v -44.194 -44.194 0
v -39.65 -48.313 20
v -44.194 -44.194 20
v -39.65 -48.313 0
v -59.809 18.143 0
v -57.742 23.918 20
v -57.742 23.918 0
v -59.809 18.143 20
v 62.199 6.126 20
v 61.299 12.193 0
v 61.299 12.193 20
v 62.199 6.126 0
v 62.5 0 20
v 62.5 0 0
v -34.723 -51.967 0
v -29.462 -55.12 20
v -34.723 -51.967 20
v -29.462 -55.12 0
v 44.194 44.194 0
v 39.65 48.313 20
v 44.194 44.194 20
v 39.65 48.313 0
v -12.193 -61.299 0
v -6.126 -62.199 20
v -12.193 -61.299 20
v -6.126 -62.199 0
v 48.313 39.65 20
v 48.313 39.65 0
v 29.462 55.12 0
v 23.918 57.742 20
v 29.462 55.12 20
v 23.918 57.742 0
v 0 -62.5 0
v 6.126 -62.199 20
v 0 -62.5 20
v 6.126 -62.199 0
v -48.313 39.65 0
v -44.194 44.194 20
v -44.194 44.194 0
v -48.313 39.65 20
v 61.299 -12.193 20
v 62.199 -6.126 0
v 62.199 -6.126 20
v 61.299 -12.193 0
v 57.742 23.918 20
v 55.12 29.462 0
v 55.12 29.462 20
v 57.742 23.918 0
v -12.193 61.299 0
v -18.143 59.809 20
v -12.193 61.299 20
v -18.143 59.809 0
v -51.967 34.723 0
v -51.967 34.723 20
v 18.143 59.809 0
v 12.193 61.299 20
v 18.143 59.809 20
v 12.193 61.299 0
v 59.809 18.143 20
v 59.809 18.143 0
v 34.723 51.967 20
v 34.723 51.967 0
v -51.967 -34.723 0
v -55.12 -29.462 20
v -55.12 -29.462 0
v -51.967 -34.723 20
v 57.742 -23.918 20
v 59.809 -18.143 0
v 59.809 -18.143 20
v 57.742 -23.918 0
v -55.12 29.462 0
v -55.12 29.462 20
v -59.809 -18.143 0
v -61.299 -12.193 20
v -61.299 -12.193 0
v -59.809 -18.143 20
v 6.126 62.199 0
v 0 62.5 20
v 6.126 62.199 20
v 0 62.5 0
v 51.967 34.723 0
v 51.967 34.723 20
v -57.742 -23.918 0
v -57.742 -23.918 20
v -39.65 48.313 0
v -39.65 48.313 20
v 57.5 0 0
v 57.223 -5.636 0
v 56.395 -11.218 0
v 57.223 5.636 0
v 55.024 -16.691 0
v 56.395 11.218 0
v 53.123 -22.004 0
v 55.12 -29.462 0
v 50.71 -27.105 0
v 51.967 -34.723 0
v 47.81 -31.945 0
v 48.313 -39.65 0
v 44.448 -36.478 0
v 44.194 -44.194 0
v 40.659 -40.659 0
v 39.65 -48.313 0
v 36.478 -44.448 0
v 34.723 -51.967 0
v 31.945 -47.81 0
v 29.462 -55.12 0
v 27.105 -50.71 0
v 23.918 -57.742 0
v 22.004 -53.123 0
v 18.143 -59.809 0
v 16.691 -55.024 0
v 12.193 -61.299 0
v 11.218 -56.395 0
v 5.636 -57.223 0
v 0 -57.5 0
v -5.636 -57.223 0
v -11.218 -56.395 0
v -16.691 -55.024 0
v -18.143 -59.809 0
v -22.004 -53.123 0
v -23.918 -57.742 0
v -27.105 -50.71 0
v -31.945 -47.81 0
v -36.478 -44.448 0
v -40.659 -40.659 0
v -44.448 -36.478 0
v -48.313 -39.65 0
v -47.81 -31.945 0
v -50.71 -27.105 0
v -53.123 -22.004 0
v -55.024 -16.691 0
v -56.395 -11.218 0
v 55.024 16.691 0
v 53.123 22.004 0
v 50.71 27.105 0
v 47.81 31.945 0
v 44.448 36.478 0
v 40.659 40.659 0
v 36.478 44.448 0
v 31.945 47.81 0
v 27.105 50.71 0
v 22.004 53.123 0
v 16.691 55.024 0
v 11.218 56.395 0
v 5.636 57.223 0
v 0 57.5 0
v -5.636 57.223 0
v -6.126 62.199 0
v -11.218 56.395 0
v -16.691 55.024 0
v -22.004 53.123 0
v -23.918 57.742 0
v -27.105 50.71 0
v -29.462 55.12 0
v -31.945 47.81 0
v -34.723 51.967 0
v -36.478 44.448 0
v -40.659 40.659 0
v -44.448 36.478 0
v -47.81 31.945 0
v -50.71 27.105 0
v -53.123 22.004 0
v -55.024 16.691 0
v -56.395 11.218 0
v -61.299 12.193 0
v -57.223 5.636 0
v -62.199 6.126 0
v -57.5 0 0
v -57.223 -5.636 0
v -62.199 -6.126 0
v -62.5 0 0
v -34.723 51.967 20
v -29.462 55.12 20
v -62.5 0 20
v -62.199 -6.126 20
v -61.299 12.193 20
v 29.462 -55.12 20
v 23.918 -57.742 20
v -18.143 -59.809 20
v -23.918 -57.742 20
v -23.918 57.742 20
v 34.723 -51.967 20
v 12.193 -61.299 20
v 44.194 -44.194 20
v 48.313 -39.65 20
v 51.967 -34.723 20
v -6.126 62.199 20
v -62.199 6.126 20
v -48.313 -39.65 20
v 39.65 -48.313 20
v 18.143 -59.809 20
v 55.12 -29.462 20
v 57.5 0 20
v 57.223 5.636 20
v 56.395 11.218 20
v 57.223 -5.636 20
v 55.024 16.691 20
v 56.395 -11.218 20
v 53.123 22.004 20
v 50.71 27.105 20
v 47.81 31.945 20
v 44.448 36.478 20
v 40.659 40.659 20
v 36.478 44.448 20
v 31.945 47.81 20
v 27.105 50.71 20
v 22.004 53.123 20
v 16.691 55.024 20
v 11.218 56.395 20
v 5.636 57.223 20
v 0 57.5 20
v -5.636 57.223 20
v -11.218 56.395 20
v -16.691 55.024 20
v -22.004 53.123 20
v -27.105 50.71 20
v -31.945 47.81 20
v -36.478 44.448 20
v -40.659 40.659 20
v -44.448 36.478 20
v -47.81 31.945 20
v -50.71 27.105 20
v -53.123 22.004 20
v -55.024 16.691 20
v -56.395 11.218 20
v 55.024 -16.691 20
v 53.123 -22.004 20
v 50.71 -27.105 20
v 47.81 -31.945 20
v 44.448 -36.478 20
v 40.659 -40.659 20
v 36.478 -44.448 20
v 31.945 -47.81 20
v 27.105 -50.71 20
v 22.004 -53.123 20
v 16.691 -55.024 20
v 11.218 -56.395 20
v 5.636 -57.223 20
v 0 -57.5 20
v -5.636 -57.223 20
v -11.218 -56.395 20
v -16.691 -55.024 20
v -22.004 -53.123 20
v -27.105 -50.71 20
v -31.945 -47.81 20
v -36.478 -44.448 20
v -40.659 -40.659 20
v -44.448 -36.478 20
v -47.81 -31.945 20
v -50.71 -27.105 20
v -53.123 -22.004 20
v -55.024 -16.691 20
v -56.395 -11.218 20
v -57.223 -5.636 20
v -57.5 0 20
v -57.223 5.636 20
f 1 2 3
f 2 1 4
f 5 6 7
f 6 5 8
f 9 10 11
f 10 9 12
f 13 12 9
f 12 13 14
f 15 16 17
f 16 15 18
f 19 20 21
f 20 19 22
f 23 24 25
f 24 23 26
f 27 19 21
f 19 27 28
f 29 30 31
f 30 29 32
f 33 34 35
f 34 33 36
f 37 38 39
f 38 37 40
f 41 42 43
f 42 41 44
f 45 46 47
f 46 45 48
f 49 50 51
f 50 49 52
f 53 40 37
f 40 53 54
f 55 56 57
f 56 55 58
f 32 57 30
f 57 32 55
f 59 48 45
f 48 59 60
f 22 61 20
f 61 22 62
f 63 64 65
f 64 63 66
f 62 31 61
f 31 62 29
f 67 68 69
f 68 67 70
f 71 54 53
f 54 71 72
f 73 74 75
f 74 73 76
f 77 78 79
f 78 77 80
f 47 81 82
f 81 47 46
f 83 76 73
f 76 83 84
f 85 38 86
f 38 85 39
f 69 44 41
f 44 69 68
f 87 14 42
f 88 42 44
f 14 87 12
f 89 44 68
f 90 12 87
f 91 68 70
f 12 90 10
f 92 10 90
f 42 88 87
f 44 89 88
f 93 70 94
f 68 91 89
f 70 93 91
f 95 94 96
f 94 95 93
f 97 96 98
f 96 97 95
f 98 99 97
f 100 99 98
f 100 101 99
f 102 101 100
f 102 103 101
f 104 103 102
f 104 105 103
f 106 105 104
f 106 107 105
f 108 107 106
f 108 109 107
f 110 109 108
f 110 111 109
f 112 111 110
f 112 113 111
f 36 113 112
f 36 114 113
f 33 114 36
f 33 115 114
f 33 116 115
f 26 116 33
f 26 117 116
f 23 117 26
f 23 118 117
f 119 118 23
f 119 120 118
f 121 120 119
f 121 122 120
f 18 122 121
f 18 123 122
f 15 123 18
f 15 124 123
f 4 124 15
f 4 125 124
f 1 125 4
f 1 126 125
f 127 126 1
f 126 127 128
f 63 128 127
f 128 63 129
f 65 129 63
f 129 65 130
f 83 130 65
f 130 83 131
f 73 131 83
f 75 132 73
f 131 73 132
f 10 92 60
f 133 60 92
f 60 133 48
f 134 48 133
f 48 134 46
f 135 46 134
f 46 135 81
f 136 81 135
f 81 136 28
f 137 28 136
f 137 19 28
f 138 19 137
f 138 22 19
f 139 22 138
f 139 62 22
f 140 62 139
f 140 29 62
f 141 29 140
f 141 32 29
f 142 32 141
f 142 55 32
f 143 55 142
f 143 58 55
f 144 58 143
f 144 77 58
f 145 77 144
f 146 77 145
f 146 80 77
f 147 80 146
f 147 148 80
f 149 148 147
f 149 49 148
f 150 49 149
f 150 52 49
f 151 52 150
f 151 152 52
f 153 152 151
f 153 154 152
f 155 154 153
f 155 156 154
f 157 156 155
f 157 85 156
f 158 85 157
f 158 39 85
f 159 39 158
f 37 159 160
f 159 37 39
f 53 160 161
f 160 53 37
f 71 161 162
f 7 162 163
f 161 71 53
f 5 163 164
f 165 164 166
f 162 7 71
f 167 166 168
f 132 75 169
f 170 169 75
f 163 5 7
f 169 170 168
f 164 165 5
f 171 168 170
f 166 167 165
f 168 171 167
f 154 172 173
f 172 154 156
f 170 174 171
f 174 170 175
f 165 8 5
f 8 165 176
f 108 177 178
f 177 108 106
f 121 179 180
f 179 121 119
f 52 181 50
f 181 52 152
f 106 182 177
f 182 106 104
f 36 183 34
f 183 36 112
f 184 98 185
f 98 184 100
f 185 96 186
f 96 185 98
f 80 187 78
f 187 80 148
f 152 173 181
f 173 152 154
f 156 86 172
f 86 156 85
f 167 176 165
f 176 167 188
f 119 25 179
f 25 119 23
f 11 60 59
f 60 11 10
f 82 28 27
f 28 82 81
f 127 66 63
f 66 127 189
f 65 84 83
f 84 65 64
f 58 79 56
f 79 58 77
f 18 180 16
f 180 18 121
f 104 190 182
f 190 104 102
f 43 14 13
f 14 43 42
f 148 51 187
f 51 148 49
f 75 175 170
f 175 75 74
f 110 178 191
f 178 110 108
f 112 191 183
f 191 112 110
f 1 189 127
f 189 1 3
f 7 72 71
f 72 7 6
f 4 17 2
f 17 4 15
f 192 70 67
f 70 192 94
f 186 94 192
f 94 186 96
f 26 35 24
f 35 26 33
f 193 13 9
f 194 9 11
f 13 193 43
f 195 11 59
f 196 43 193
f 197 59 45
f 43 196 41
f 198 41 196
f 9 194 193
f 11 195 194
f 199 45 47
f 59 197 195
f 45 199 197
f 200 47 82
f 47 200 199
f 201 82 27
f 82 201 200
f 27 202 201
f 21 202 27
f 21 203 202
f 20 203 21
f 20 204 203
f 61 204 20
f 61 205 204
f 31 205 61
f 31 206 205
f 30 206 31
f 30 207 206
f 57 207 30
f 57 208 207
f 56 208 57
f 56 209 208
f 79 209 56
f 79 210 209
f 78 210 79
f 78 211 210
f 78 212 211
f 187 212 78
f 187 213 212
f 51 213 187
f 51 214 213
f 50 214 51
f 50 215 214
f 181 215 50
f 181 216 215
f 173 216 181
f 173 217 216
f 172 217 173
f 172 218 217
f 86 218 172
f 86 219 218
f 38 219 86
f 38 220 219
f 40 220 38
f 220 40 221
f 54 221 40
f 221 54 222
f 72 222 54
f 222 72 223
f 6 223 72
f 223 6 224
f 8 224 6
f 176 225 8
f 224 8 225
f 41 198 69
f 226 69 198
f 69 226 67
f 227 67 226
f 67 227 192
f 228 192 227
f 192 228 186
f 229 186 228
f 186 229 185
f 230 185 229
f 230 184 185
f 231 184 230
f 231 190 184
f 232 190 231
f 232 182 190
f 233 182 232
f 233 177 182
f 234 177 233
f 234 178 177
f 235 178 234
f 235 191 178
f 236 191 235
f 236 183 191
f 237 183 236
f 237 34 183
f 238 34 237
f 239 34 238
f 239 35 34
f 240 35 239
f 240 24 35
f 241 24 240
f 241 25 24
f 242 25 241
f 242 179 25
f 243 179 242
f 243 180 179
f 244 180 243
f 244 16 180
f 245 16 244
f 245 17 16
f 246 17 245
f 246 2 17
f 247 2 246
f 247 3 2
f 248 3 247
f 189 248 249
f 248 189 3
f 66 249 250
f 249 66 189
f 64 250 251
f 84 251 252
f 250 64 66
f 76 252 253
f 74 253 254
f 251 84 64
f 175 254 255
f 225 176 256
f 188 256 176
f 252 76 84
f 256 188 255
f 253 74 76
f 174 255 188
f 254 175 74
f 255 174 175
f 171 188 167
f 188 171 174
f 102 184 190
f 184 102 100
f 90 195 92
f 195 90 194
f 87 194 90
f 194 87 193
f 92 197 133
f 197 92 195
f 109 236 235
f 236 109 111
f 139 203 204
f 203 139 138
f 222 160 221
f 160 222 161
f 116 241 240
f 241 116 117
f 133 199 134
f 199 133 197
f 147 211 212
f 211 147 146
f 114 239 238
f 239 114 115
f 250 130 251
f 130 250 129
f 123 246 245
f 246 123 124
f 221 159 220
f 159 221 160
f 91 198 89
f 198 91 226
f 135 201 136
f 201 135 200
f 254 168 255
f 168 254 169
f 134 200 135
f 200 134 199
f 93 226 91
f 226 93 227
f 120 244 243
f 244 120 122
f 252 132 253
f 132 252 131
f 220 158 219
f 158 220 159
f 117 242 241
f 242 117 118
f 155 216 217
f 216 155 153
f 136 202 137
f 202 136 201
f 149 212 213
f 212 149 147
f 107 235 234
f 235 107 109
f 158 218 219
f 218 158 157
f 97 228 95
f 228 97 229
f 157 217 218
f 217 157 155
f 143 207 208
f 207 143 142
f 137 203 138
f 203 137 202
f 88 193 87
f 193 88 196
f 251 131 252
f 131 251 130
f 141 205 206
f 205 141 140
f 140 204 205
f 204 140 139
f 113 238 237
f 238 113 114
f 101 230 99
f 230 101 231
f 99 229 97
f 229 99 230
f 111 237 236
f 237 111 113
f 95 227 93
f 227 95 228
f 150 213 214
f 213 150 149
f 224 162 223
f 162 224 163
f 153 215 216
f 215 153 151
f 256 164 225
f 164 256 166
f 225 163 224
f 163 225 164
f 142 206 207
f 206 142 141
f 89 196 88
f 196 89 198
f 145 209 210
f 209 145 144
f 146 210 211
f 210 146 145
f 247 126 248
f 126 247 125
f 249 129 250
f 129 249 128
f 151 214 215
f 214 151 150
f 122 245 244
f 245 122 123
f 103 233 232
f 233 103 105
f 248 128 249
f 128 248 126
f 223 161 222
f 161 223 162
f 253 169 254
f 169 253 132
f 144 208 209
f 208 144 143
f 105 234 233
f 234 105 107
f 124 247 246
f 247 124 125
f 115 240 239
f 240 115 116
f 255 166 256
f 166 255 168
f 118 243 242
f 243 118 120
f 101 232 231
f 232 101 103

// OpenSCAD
module ht_125_cap() {
    difference() {
        // Outer cap
        cylinder(h=20, d=125, $fn=64);
        
        // Inner hollow part
        translate([0, 0, -1])
            cylinder(h=21, d=115, $fn=64);
    }
}

ht_125_cap();
